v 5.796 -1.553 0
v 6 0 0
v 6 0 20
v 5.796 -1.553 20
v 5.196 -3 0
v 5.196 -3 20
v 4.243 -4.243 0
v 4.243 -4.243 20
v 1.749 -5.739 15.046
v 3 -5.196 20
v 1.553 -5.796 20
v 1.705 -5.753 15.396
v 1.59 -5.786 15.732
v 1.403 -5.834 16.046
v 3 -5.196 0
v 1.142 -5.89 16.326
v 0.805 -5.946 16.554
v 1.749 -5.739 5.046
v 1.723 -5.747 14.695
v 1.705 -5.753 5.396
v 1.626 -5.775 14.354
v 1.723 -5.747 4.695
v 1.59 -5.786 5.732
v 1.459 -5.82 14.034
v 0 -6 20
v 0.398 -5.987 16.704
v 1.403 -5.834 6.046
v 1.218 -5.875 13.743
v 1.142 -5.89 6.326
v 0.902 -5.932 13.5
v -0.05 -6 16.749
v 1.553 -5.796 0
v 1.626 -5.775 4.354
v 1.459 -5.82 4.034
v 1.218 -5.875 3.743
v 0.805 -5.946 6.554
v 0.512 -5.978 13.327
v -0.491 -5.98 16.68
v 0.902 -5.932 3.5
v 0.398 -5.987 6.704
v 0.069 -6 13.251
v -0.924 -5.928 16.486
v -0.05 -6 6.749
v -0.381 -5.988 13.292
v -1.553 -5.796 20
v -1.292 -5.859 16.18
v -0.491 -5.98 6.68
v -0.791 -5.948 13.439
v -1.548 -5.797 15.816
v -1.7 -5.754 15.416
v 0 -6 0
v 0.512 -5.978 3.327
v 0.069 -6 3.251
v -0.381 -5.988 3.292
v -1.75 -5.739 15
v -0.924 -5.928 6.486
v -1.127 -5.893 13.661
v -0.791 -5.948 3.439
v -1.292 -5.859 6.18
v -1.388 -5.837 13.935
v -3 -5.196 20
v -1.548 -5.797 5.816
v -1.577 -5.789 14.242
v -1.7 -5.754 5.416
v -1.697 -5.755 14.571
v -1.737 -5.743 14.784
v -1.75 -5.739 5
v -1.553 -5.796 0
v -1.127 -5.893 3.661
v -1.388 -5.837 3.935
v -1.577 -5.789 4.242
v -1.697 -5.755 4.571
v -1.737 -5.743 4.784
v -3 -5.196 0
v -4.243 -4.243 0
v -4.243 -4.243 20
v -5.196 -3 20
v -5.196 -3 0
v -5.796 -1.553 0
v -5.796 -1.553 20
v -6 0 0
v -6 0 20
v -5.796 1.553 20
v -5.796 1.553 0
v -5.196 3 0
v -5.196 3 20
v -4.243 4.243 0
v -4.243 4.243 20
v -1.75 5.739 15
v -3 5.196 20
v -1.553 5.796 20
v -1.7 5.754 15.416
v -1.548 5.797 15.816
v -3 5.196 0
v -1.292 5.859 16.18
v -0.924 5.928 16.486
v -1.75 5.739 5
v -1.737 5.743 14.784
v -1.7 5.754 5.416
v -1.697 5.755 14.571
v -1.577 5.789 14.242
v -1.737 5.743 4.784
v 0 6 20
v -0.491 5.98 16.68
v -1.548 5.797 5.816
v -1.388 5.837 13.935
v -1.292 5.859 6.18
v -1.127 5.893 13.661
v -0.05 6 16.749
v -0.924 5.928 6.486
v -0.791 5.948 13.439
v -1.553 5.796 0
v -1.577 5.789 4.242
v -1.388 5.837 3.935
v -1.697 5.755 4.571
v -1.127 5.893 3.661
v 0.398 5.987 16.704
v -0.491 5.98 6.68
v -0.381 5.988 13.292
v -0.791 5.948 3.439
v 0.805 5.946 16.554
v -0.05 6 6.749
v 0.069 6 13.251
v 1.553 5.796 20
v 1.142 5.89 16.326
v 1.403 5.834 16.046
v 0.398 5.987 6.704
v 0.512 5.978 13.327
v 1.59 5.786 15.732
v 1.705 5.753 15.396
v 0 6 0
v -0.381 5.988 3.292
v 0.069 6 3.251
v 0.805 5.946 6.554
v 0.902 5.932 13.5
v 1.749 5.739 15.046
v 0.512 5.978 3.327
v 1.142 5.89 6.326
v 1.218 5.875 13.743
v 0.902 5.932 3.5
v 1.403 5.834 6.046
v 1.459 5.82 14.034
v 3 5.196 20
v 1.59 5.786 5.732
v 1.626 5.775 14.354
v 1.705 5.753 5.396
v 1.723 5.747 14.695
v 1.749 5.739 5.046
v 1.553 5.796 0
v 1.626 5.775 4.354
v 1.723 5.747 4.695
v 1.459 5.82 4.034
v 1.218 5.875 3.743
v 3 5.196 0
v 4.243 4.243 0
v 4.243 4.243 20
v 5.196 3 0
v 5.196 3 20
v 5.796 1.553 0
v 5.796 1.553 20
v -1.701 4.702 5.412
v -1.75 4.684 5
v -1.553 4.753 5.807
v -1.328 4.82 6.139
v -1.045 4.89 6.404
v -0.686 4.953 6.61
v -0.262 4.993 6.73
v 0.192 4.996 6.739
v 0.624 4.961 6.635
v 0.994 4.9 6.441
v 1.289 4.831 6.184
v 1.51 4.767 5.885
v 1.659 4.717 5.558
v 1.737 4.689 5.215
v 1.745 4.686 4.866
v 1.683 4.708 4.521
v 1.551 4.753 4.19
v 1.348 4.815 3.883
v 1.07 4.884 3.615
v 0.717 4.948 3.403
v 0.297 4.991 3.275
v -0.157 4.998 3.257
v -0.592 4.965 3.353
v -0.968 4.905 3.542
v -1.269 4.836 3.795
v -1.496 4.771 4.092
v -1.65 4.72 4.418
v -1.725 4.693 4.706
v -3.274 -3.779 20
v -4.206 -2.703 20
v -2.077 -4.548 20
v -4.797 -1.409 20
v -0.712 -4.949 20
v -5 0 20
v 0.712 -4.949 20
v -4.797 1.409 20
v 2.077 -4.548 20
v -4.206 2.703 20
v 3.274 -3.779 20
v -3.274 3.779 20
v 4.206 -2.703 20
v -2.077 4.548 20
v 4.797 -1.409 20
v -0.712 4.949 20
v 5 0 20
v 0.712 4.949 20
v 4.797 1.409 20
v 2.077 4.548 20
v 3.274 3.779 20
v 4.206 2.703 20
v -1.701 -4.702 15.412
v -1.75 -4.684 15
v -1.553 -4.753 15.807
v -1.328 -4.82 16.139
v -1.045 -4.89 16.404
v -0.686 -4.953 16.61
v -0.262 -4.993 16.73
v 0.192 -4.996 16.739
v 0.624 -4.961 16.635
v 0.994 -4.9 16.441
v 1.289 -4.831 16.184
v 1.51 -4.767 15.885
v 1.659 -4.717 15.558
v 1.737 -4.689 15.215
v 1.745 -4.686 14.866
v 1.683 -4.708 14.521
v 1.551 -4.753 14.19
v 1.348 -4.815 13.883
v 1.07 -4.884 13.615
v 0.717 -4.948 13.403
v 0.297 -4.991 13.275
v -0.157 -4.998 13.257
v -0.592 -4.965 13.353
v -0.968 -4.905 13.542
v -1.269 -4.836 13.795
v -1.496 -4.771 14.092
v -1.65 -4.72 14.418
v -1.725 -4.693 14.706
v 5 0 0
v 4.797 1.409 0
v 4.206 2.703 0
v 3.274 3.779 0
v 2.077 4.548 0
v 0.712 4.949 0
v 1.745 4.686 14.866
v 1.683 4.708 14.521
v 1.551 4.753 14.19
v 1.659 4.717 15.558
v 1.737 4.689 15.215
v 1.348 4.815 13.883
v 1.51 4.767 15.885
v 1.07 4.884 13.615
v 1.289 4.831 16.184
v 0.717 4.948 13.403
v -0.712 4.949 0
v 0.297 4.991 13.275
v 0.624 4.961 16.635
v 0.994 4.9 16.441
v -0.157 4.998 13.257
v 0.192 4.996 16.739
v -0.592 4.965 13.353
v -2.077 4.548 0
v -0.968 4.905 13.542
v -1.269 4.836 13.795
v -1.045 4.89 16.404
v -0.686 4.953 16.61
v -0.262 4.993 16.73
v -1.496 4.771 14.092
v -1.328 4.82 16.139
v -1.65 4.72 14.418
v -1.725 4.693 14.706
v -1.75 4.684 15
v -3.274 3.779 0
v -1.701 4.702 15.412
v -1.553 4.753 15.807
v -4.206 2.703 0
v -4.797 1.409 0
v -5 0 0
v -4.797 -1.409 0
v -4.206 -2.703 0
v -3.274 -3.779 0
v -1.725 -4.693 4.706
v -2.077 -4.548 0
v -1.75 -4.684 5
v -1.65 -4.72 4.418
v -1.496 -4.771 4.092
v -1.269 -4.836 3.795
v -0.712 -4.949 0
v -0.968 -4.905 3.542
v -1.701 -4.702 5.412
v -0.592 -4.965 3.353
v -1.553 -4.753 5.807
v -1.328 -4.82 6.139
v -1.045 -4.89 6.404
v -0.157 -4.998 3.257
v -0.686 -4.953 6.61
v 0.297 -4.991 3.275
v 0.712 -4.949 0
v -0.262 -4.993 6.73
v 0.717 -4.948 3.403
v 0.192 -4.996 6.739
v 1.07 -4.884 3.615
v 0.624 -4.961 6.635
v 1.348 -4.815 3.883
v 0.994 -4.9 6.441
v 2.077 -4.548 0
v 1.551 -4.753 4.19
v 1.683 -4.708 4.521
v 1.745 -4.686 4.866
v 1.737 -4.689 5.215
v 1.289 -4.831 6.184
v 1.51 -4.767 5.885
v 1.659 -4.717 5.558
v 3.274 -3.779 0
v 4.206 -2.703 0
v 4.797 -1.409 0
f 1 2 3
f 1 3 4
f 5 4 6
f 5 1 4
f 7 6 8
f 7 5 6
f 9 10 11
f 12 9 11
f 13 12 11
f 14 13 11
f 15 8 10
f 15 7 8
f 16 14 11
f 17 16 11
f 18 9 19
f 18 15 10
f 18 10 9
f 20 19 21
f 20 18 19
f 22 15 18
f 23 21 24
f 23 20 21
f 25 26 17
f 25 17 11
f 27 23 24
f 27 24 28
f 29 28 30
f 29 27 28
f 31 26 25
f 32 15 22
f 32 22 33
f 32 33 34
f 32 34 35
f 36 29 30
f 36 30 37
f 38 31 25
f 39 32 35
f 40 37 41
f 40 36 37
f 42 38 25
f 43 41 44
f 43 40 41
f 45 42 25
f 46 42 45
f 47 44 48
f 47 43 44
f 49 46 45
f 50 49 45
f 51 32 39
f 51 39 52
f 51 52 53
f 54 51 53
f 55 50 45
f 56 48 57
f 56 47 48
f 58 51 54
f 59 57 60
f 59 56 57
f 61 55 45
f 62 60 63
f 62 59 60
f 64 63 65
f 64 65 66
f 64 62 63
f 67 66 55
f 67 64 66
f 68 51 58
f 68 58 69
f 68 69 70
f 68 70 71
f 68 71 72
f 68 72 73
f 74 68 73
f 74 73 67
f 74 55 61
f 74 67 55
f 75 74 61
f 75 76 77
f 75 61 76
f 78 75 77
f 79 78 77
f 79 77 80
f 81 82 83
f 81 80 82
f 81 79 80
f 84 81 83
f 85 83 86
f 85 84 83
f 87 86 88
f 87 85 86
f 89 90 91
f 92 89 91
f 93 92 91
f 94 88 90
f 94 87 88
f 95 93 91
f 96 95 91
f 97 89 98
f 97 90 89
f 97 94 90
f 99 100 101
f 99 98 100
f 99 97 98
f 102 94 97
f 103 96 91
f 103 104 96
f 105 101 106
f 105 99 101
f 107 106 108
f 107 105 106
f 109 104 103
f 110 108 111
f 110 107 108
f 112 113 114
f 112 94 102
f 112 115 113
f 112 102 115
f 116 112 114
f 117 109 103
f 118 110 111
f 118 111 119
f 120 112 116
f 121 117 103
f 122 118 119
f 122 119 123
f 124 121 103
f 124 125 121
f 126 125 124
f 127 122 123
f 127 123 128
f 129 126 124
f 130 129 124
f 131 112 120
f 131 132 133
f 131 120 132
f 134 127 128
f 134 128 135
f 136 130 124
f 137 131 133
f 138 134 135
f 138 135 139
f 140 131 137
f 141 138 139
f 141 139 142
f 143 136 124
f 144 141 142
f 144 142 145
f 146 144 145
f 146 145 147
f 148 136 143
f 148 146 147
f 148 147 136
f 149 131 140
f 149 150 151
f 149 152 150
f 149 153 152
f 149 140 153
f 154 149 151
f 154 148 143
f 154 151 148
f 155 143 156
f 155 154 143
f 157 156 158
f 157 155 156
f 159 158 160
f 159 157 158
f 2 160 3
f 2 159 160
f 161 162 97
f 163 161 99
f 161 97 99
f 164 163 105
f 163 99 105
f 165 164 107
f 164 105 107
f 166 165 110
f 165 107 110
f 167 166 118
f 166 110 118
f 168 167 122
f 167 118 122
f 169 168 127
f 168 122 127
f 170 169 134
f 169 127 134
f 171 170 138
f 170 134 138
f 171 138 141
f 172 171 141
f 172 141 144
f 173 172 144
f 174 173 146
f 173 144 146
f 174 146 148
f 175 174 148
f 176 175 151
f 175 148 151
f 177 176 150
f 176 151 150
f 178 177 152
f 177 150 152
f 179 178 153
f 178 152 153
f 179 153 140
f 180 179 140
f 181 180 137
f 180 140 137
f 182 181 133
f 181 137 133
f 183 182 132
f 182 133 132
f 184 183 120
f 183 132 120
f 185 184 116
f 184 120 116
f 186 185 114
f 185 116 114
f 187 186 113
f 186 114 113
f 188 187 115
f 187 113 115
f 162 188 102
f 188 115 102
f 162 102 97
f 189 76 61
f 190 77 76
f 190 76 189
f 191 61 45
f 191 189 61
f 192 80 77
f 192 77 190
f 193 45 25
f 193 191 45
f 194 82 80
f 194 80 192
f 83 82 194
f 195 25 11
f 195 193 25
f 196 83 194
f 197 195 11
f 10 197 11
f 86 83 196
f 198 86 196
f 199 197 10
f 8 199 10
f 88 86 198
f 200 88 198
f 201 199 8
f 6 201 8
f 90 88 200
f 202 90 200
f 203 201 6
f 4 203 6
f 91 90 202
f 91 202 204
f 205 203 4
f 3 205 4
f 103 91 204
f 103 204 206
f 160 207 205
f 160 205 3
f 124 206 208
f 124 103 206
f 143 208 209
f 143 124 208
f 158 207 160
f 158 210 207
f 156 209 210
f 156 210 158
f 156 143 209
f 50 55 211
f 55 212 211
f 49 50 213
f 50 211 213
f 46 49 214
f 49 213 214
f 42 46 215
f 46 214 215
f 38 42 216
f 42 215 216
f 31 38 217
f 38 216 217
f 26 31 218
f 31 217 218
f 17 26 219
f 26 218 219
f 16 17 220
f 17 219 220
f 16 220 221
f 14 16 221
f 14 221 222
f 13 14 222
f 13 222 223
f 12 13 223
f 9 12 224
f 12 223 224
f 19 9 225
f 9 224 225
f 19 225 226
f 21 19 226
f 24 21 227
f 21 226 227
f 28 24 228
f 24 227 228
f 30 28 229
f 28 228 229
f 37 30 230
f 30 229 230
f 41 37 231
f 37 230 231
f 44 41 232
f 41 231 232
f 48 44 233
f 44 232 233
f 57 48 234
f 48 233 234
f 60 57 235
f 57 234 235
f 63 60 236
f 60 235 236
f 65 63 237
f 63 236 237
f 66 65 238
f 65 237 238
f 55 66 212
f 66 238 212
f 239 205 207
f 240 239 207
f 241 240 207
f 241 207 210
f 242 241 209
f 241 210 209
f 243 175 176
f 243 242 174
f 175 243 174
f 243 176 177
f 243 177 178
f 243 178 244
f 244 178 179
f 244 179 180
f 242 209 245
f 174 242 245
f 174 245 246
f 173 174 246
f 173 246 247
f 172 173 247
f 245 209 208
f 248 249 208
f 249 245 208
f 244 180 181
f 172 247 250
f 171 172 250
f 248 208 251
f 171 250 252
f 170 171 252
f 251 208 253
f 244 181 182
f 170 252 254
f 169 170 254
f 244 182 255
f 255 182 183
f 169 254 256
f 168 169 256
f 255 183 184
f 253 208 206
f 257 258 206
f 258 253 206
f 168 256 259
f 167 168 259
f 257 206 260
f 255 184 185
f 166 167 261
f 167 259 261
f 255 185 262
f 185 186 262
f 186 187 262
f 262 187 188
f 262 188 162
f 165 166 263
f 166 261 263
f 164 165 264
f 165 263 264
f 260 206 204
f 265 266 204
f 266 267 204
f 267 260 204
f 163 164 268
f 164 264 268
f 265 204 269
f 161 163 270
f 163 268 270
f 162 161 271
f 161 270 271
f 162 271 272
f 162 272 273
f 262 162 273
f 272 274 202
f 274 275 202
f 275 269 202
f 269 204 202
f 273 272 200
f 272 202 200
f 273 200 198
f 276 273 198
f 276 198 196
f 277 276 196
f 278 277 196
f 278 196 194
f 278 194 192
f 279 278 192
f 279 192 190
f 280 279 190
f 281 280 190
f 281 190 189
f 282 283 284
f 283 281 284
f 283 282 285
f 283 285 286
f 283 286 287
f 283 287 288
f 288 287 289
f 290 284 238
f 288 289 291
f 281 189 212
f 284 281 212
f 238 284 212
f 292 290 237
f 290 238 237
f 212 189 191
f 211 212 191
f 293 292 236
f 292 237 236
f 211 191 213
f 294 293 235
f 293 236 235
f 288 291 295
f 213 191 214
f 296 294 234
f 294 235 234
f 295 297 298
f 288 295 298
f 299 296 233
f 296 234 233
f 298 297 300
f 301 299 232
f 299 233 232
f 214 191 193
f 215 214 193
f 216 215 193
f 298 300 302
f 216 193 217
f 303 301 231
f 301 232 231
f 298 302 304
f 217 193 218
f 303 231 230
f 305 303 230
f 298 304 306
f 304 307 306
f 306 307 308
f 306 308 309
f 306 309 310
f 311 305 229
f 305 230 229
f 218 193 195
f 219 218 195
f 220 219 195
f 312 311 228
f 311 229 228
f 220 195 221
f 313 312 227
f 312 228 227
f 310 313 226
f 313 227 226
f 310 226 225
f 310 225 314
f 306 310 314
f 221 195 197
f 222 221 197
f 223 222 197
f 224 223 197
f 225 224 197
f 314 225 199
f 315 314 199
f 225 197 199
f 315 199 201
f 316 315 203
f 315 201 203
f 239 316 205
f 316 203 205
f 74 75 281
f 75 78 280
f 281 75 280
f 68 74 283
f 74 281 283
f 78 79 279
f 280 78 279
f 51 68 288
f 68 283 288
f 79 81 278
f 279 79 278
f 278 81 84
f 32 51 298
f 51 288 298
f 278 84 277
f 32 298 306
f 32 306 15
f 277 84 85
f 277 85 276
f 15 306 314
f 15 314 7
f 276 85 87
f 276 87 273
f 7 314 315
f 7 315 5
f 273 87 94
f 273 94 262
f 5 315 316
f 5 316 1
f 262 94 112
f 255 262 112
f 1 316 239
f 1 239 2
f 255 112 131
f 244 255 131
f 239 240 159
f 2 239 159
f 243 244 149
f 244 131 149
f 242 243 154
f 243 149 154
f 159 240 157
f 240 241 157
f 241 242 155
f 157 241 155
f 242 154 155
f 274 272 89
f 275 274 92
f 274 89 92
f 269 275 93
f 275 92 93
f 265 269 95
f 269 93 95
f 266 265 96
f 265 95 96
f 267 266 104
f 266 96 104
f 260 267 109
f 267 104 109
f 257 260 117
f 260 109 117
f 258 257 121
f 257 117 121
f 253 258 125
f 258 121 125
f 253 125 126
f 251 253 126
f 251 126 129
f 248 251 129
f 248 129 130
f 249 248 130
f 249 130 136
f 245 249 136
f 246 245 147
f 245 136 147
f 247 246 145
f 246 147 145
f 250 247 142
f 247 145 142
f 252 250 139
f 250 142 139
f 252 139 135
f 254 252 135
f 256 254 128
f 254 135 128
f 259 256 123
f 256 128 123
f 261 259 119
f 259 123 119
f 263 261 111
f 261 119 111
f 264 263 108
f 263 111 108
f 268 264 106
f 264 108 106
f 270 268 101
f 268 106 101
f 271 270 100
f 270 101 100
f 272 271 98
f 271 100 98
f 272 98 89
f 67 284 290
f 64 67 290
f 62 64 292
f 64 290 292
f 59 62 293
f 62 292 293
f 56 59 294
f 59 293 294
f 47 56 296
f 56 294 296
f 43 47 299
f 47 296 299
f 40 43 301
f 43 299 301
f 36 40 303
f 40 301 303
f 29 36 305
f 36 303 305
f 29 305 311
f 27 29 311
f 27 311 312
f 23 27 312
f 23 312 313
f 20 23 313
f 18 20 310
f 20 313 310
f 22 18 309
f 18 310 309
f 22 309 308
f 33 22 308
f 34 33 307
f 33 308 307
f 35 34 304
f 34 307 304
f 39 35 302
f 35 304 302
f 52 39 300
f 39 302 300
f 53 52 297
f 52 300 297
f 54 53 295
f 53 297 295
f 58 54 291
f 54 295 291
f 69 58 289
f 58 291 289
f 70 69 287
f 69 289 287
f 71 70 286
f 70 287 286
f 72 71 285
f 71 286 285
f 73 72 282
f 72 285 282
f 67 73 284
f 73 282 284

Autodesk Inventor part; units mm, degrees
ref_plane "YZ Plane" through (0, 0, 0) normal (1, 0, 0) x (0, 1, 0)
ref_plane "XZ Plane" through (0, 0, 0) normal (0, 1, 0) x (-1, 0, 0)
ref_plane "XY Plane" through (0, 0, 0) normal (0, 0, 1) x (1, 0, 0)
sketch "Sketch1" plane through (0, 0, 0) normal (0, 0, 1) x (1, 0, 0)
  point P0 (0, 0)
sketch "Sketch2" plane through (0, 0, 0) normal (0, 0, 1) x (1, 0, 0)
  circle A0 centre (0, 0) radius 6
  dimension "d0" = 12
extrude "Extrusion1" add sketch "Sketch2" along normal blind 20
sketch "Sketch3" plane through (0, 0, 0) normal (1, 0, 0) x (0, 1, 0)
  point P0 (0, 0)
sketch "Sketch4" plane through (0, 0, 20) normal (0, 0, 1) x (1, 0, 0)
  circle A0 centre (0, 0) radius 5
  dimension "d3" = 10
extrude "Extrusion2" cut sketch "Sketch4" against normal through all
sketch "Sketch5" plane through (0, 0, 0) normal (0, 1, 0) x (-1, 0, 0)
  line L0 (6, 20) -> (-6, 20) projected
  line L1 (0, 20) -> (0, 15)
  line L2 (0, 15) -> (0, 5)
  circle A0 centre (0, 15) radius 1.75
  circle A1 centre (0, 5) radius 1.75
  point P0 (0, 0)
  dimension "d6" = 5
  dimension "d7" = 10
  dimension "d8" = 3.5
  dimension "d9" = 3.5
extrude "Extrusion3" cut sketch "Sketch5" along normal through all both and the other way through all
properties part number "two way connector for capping system"
